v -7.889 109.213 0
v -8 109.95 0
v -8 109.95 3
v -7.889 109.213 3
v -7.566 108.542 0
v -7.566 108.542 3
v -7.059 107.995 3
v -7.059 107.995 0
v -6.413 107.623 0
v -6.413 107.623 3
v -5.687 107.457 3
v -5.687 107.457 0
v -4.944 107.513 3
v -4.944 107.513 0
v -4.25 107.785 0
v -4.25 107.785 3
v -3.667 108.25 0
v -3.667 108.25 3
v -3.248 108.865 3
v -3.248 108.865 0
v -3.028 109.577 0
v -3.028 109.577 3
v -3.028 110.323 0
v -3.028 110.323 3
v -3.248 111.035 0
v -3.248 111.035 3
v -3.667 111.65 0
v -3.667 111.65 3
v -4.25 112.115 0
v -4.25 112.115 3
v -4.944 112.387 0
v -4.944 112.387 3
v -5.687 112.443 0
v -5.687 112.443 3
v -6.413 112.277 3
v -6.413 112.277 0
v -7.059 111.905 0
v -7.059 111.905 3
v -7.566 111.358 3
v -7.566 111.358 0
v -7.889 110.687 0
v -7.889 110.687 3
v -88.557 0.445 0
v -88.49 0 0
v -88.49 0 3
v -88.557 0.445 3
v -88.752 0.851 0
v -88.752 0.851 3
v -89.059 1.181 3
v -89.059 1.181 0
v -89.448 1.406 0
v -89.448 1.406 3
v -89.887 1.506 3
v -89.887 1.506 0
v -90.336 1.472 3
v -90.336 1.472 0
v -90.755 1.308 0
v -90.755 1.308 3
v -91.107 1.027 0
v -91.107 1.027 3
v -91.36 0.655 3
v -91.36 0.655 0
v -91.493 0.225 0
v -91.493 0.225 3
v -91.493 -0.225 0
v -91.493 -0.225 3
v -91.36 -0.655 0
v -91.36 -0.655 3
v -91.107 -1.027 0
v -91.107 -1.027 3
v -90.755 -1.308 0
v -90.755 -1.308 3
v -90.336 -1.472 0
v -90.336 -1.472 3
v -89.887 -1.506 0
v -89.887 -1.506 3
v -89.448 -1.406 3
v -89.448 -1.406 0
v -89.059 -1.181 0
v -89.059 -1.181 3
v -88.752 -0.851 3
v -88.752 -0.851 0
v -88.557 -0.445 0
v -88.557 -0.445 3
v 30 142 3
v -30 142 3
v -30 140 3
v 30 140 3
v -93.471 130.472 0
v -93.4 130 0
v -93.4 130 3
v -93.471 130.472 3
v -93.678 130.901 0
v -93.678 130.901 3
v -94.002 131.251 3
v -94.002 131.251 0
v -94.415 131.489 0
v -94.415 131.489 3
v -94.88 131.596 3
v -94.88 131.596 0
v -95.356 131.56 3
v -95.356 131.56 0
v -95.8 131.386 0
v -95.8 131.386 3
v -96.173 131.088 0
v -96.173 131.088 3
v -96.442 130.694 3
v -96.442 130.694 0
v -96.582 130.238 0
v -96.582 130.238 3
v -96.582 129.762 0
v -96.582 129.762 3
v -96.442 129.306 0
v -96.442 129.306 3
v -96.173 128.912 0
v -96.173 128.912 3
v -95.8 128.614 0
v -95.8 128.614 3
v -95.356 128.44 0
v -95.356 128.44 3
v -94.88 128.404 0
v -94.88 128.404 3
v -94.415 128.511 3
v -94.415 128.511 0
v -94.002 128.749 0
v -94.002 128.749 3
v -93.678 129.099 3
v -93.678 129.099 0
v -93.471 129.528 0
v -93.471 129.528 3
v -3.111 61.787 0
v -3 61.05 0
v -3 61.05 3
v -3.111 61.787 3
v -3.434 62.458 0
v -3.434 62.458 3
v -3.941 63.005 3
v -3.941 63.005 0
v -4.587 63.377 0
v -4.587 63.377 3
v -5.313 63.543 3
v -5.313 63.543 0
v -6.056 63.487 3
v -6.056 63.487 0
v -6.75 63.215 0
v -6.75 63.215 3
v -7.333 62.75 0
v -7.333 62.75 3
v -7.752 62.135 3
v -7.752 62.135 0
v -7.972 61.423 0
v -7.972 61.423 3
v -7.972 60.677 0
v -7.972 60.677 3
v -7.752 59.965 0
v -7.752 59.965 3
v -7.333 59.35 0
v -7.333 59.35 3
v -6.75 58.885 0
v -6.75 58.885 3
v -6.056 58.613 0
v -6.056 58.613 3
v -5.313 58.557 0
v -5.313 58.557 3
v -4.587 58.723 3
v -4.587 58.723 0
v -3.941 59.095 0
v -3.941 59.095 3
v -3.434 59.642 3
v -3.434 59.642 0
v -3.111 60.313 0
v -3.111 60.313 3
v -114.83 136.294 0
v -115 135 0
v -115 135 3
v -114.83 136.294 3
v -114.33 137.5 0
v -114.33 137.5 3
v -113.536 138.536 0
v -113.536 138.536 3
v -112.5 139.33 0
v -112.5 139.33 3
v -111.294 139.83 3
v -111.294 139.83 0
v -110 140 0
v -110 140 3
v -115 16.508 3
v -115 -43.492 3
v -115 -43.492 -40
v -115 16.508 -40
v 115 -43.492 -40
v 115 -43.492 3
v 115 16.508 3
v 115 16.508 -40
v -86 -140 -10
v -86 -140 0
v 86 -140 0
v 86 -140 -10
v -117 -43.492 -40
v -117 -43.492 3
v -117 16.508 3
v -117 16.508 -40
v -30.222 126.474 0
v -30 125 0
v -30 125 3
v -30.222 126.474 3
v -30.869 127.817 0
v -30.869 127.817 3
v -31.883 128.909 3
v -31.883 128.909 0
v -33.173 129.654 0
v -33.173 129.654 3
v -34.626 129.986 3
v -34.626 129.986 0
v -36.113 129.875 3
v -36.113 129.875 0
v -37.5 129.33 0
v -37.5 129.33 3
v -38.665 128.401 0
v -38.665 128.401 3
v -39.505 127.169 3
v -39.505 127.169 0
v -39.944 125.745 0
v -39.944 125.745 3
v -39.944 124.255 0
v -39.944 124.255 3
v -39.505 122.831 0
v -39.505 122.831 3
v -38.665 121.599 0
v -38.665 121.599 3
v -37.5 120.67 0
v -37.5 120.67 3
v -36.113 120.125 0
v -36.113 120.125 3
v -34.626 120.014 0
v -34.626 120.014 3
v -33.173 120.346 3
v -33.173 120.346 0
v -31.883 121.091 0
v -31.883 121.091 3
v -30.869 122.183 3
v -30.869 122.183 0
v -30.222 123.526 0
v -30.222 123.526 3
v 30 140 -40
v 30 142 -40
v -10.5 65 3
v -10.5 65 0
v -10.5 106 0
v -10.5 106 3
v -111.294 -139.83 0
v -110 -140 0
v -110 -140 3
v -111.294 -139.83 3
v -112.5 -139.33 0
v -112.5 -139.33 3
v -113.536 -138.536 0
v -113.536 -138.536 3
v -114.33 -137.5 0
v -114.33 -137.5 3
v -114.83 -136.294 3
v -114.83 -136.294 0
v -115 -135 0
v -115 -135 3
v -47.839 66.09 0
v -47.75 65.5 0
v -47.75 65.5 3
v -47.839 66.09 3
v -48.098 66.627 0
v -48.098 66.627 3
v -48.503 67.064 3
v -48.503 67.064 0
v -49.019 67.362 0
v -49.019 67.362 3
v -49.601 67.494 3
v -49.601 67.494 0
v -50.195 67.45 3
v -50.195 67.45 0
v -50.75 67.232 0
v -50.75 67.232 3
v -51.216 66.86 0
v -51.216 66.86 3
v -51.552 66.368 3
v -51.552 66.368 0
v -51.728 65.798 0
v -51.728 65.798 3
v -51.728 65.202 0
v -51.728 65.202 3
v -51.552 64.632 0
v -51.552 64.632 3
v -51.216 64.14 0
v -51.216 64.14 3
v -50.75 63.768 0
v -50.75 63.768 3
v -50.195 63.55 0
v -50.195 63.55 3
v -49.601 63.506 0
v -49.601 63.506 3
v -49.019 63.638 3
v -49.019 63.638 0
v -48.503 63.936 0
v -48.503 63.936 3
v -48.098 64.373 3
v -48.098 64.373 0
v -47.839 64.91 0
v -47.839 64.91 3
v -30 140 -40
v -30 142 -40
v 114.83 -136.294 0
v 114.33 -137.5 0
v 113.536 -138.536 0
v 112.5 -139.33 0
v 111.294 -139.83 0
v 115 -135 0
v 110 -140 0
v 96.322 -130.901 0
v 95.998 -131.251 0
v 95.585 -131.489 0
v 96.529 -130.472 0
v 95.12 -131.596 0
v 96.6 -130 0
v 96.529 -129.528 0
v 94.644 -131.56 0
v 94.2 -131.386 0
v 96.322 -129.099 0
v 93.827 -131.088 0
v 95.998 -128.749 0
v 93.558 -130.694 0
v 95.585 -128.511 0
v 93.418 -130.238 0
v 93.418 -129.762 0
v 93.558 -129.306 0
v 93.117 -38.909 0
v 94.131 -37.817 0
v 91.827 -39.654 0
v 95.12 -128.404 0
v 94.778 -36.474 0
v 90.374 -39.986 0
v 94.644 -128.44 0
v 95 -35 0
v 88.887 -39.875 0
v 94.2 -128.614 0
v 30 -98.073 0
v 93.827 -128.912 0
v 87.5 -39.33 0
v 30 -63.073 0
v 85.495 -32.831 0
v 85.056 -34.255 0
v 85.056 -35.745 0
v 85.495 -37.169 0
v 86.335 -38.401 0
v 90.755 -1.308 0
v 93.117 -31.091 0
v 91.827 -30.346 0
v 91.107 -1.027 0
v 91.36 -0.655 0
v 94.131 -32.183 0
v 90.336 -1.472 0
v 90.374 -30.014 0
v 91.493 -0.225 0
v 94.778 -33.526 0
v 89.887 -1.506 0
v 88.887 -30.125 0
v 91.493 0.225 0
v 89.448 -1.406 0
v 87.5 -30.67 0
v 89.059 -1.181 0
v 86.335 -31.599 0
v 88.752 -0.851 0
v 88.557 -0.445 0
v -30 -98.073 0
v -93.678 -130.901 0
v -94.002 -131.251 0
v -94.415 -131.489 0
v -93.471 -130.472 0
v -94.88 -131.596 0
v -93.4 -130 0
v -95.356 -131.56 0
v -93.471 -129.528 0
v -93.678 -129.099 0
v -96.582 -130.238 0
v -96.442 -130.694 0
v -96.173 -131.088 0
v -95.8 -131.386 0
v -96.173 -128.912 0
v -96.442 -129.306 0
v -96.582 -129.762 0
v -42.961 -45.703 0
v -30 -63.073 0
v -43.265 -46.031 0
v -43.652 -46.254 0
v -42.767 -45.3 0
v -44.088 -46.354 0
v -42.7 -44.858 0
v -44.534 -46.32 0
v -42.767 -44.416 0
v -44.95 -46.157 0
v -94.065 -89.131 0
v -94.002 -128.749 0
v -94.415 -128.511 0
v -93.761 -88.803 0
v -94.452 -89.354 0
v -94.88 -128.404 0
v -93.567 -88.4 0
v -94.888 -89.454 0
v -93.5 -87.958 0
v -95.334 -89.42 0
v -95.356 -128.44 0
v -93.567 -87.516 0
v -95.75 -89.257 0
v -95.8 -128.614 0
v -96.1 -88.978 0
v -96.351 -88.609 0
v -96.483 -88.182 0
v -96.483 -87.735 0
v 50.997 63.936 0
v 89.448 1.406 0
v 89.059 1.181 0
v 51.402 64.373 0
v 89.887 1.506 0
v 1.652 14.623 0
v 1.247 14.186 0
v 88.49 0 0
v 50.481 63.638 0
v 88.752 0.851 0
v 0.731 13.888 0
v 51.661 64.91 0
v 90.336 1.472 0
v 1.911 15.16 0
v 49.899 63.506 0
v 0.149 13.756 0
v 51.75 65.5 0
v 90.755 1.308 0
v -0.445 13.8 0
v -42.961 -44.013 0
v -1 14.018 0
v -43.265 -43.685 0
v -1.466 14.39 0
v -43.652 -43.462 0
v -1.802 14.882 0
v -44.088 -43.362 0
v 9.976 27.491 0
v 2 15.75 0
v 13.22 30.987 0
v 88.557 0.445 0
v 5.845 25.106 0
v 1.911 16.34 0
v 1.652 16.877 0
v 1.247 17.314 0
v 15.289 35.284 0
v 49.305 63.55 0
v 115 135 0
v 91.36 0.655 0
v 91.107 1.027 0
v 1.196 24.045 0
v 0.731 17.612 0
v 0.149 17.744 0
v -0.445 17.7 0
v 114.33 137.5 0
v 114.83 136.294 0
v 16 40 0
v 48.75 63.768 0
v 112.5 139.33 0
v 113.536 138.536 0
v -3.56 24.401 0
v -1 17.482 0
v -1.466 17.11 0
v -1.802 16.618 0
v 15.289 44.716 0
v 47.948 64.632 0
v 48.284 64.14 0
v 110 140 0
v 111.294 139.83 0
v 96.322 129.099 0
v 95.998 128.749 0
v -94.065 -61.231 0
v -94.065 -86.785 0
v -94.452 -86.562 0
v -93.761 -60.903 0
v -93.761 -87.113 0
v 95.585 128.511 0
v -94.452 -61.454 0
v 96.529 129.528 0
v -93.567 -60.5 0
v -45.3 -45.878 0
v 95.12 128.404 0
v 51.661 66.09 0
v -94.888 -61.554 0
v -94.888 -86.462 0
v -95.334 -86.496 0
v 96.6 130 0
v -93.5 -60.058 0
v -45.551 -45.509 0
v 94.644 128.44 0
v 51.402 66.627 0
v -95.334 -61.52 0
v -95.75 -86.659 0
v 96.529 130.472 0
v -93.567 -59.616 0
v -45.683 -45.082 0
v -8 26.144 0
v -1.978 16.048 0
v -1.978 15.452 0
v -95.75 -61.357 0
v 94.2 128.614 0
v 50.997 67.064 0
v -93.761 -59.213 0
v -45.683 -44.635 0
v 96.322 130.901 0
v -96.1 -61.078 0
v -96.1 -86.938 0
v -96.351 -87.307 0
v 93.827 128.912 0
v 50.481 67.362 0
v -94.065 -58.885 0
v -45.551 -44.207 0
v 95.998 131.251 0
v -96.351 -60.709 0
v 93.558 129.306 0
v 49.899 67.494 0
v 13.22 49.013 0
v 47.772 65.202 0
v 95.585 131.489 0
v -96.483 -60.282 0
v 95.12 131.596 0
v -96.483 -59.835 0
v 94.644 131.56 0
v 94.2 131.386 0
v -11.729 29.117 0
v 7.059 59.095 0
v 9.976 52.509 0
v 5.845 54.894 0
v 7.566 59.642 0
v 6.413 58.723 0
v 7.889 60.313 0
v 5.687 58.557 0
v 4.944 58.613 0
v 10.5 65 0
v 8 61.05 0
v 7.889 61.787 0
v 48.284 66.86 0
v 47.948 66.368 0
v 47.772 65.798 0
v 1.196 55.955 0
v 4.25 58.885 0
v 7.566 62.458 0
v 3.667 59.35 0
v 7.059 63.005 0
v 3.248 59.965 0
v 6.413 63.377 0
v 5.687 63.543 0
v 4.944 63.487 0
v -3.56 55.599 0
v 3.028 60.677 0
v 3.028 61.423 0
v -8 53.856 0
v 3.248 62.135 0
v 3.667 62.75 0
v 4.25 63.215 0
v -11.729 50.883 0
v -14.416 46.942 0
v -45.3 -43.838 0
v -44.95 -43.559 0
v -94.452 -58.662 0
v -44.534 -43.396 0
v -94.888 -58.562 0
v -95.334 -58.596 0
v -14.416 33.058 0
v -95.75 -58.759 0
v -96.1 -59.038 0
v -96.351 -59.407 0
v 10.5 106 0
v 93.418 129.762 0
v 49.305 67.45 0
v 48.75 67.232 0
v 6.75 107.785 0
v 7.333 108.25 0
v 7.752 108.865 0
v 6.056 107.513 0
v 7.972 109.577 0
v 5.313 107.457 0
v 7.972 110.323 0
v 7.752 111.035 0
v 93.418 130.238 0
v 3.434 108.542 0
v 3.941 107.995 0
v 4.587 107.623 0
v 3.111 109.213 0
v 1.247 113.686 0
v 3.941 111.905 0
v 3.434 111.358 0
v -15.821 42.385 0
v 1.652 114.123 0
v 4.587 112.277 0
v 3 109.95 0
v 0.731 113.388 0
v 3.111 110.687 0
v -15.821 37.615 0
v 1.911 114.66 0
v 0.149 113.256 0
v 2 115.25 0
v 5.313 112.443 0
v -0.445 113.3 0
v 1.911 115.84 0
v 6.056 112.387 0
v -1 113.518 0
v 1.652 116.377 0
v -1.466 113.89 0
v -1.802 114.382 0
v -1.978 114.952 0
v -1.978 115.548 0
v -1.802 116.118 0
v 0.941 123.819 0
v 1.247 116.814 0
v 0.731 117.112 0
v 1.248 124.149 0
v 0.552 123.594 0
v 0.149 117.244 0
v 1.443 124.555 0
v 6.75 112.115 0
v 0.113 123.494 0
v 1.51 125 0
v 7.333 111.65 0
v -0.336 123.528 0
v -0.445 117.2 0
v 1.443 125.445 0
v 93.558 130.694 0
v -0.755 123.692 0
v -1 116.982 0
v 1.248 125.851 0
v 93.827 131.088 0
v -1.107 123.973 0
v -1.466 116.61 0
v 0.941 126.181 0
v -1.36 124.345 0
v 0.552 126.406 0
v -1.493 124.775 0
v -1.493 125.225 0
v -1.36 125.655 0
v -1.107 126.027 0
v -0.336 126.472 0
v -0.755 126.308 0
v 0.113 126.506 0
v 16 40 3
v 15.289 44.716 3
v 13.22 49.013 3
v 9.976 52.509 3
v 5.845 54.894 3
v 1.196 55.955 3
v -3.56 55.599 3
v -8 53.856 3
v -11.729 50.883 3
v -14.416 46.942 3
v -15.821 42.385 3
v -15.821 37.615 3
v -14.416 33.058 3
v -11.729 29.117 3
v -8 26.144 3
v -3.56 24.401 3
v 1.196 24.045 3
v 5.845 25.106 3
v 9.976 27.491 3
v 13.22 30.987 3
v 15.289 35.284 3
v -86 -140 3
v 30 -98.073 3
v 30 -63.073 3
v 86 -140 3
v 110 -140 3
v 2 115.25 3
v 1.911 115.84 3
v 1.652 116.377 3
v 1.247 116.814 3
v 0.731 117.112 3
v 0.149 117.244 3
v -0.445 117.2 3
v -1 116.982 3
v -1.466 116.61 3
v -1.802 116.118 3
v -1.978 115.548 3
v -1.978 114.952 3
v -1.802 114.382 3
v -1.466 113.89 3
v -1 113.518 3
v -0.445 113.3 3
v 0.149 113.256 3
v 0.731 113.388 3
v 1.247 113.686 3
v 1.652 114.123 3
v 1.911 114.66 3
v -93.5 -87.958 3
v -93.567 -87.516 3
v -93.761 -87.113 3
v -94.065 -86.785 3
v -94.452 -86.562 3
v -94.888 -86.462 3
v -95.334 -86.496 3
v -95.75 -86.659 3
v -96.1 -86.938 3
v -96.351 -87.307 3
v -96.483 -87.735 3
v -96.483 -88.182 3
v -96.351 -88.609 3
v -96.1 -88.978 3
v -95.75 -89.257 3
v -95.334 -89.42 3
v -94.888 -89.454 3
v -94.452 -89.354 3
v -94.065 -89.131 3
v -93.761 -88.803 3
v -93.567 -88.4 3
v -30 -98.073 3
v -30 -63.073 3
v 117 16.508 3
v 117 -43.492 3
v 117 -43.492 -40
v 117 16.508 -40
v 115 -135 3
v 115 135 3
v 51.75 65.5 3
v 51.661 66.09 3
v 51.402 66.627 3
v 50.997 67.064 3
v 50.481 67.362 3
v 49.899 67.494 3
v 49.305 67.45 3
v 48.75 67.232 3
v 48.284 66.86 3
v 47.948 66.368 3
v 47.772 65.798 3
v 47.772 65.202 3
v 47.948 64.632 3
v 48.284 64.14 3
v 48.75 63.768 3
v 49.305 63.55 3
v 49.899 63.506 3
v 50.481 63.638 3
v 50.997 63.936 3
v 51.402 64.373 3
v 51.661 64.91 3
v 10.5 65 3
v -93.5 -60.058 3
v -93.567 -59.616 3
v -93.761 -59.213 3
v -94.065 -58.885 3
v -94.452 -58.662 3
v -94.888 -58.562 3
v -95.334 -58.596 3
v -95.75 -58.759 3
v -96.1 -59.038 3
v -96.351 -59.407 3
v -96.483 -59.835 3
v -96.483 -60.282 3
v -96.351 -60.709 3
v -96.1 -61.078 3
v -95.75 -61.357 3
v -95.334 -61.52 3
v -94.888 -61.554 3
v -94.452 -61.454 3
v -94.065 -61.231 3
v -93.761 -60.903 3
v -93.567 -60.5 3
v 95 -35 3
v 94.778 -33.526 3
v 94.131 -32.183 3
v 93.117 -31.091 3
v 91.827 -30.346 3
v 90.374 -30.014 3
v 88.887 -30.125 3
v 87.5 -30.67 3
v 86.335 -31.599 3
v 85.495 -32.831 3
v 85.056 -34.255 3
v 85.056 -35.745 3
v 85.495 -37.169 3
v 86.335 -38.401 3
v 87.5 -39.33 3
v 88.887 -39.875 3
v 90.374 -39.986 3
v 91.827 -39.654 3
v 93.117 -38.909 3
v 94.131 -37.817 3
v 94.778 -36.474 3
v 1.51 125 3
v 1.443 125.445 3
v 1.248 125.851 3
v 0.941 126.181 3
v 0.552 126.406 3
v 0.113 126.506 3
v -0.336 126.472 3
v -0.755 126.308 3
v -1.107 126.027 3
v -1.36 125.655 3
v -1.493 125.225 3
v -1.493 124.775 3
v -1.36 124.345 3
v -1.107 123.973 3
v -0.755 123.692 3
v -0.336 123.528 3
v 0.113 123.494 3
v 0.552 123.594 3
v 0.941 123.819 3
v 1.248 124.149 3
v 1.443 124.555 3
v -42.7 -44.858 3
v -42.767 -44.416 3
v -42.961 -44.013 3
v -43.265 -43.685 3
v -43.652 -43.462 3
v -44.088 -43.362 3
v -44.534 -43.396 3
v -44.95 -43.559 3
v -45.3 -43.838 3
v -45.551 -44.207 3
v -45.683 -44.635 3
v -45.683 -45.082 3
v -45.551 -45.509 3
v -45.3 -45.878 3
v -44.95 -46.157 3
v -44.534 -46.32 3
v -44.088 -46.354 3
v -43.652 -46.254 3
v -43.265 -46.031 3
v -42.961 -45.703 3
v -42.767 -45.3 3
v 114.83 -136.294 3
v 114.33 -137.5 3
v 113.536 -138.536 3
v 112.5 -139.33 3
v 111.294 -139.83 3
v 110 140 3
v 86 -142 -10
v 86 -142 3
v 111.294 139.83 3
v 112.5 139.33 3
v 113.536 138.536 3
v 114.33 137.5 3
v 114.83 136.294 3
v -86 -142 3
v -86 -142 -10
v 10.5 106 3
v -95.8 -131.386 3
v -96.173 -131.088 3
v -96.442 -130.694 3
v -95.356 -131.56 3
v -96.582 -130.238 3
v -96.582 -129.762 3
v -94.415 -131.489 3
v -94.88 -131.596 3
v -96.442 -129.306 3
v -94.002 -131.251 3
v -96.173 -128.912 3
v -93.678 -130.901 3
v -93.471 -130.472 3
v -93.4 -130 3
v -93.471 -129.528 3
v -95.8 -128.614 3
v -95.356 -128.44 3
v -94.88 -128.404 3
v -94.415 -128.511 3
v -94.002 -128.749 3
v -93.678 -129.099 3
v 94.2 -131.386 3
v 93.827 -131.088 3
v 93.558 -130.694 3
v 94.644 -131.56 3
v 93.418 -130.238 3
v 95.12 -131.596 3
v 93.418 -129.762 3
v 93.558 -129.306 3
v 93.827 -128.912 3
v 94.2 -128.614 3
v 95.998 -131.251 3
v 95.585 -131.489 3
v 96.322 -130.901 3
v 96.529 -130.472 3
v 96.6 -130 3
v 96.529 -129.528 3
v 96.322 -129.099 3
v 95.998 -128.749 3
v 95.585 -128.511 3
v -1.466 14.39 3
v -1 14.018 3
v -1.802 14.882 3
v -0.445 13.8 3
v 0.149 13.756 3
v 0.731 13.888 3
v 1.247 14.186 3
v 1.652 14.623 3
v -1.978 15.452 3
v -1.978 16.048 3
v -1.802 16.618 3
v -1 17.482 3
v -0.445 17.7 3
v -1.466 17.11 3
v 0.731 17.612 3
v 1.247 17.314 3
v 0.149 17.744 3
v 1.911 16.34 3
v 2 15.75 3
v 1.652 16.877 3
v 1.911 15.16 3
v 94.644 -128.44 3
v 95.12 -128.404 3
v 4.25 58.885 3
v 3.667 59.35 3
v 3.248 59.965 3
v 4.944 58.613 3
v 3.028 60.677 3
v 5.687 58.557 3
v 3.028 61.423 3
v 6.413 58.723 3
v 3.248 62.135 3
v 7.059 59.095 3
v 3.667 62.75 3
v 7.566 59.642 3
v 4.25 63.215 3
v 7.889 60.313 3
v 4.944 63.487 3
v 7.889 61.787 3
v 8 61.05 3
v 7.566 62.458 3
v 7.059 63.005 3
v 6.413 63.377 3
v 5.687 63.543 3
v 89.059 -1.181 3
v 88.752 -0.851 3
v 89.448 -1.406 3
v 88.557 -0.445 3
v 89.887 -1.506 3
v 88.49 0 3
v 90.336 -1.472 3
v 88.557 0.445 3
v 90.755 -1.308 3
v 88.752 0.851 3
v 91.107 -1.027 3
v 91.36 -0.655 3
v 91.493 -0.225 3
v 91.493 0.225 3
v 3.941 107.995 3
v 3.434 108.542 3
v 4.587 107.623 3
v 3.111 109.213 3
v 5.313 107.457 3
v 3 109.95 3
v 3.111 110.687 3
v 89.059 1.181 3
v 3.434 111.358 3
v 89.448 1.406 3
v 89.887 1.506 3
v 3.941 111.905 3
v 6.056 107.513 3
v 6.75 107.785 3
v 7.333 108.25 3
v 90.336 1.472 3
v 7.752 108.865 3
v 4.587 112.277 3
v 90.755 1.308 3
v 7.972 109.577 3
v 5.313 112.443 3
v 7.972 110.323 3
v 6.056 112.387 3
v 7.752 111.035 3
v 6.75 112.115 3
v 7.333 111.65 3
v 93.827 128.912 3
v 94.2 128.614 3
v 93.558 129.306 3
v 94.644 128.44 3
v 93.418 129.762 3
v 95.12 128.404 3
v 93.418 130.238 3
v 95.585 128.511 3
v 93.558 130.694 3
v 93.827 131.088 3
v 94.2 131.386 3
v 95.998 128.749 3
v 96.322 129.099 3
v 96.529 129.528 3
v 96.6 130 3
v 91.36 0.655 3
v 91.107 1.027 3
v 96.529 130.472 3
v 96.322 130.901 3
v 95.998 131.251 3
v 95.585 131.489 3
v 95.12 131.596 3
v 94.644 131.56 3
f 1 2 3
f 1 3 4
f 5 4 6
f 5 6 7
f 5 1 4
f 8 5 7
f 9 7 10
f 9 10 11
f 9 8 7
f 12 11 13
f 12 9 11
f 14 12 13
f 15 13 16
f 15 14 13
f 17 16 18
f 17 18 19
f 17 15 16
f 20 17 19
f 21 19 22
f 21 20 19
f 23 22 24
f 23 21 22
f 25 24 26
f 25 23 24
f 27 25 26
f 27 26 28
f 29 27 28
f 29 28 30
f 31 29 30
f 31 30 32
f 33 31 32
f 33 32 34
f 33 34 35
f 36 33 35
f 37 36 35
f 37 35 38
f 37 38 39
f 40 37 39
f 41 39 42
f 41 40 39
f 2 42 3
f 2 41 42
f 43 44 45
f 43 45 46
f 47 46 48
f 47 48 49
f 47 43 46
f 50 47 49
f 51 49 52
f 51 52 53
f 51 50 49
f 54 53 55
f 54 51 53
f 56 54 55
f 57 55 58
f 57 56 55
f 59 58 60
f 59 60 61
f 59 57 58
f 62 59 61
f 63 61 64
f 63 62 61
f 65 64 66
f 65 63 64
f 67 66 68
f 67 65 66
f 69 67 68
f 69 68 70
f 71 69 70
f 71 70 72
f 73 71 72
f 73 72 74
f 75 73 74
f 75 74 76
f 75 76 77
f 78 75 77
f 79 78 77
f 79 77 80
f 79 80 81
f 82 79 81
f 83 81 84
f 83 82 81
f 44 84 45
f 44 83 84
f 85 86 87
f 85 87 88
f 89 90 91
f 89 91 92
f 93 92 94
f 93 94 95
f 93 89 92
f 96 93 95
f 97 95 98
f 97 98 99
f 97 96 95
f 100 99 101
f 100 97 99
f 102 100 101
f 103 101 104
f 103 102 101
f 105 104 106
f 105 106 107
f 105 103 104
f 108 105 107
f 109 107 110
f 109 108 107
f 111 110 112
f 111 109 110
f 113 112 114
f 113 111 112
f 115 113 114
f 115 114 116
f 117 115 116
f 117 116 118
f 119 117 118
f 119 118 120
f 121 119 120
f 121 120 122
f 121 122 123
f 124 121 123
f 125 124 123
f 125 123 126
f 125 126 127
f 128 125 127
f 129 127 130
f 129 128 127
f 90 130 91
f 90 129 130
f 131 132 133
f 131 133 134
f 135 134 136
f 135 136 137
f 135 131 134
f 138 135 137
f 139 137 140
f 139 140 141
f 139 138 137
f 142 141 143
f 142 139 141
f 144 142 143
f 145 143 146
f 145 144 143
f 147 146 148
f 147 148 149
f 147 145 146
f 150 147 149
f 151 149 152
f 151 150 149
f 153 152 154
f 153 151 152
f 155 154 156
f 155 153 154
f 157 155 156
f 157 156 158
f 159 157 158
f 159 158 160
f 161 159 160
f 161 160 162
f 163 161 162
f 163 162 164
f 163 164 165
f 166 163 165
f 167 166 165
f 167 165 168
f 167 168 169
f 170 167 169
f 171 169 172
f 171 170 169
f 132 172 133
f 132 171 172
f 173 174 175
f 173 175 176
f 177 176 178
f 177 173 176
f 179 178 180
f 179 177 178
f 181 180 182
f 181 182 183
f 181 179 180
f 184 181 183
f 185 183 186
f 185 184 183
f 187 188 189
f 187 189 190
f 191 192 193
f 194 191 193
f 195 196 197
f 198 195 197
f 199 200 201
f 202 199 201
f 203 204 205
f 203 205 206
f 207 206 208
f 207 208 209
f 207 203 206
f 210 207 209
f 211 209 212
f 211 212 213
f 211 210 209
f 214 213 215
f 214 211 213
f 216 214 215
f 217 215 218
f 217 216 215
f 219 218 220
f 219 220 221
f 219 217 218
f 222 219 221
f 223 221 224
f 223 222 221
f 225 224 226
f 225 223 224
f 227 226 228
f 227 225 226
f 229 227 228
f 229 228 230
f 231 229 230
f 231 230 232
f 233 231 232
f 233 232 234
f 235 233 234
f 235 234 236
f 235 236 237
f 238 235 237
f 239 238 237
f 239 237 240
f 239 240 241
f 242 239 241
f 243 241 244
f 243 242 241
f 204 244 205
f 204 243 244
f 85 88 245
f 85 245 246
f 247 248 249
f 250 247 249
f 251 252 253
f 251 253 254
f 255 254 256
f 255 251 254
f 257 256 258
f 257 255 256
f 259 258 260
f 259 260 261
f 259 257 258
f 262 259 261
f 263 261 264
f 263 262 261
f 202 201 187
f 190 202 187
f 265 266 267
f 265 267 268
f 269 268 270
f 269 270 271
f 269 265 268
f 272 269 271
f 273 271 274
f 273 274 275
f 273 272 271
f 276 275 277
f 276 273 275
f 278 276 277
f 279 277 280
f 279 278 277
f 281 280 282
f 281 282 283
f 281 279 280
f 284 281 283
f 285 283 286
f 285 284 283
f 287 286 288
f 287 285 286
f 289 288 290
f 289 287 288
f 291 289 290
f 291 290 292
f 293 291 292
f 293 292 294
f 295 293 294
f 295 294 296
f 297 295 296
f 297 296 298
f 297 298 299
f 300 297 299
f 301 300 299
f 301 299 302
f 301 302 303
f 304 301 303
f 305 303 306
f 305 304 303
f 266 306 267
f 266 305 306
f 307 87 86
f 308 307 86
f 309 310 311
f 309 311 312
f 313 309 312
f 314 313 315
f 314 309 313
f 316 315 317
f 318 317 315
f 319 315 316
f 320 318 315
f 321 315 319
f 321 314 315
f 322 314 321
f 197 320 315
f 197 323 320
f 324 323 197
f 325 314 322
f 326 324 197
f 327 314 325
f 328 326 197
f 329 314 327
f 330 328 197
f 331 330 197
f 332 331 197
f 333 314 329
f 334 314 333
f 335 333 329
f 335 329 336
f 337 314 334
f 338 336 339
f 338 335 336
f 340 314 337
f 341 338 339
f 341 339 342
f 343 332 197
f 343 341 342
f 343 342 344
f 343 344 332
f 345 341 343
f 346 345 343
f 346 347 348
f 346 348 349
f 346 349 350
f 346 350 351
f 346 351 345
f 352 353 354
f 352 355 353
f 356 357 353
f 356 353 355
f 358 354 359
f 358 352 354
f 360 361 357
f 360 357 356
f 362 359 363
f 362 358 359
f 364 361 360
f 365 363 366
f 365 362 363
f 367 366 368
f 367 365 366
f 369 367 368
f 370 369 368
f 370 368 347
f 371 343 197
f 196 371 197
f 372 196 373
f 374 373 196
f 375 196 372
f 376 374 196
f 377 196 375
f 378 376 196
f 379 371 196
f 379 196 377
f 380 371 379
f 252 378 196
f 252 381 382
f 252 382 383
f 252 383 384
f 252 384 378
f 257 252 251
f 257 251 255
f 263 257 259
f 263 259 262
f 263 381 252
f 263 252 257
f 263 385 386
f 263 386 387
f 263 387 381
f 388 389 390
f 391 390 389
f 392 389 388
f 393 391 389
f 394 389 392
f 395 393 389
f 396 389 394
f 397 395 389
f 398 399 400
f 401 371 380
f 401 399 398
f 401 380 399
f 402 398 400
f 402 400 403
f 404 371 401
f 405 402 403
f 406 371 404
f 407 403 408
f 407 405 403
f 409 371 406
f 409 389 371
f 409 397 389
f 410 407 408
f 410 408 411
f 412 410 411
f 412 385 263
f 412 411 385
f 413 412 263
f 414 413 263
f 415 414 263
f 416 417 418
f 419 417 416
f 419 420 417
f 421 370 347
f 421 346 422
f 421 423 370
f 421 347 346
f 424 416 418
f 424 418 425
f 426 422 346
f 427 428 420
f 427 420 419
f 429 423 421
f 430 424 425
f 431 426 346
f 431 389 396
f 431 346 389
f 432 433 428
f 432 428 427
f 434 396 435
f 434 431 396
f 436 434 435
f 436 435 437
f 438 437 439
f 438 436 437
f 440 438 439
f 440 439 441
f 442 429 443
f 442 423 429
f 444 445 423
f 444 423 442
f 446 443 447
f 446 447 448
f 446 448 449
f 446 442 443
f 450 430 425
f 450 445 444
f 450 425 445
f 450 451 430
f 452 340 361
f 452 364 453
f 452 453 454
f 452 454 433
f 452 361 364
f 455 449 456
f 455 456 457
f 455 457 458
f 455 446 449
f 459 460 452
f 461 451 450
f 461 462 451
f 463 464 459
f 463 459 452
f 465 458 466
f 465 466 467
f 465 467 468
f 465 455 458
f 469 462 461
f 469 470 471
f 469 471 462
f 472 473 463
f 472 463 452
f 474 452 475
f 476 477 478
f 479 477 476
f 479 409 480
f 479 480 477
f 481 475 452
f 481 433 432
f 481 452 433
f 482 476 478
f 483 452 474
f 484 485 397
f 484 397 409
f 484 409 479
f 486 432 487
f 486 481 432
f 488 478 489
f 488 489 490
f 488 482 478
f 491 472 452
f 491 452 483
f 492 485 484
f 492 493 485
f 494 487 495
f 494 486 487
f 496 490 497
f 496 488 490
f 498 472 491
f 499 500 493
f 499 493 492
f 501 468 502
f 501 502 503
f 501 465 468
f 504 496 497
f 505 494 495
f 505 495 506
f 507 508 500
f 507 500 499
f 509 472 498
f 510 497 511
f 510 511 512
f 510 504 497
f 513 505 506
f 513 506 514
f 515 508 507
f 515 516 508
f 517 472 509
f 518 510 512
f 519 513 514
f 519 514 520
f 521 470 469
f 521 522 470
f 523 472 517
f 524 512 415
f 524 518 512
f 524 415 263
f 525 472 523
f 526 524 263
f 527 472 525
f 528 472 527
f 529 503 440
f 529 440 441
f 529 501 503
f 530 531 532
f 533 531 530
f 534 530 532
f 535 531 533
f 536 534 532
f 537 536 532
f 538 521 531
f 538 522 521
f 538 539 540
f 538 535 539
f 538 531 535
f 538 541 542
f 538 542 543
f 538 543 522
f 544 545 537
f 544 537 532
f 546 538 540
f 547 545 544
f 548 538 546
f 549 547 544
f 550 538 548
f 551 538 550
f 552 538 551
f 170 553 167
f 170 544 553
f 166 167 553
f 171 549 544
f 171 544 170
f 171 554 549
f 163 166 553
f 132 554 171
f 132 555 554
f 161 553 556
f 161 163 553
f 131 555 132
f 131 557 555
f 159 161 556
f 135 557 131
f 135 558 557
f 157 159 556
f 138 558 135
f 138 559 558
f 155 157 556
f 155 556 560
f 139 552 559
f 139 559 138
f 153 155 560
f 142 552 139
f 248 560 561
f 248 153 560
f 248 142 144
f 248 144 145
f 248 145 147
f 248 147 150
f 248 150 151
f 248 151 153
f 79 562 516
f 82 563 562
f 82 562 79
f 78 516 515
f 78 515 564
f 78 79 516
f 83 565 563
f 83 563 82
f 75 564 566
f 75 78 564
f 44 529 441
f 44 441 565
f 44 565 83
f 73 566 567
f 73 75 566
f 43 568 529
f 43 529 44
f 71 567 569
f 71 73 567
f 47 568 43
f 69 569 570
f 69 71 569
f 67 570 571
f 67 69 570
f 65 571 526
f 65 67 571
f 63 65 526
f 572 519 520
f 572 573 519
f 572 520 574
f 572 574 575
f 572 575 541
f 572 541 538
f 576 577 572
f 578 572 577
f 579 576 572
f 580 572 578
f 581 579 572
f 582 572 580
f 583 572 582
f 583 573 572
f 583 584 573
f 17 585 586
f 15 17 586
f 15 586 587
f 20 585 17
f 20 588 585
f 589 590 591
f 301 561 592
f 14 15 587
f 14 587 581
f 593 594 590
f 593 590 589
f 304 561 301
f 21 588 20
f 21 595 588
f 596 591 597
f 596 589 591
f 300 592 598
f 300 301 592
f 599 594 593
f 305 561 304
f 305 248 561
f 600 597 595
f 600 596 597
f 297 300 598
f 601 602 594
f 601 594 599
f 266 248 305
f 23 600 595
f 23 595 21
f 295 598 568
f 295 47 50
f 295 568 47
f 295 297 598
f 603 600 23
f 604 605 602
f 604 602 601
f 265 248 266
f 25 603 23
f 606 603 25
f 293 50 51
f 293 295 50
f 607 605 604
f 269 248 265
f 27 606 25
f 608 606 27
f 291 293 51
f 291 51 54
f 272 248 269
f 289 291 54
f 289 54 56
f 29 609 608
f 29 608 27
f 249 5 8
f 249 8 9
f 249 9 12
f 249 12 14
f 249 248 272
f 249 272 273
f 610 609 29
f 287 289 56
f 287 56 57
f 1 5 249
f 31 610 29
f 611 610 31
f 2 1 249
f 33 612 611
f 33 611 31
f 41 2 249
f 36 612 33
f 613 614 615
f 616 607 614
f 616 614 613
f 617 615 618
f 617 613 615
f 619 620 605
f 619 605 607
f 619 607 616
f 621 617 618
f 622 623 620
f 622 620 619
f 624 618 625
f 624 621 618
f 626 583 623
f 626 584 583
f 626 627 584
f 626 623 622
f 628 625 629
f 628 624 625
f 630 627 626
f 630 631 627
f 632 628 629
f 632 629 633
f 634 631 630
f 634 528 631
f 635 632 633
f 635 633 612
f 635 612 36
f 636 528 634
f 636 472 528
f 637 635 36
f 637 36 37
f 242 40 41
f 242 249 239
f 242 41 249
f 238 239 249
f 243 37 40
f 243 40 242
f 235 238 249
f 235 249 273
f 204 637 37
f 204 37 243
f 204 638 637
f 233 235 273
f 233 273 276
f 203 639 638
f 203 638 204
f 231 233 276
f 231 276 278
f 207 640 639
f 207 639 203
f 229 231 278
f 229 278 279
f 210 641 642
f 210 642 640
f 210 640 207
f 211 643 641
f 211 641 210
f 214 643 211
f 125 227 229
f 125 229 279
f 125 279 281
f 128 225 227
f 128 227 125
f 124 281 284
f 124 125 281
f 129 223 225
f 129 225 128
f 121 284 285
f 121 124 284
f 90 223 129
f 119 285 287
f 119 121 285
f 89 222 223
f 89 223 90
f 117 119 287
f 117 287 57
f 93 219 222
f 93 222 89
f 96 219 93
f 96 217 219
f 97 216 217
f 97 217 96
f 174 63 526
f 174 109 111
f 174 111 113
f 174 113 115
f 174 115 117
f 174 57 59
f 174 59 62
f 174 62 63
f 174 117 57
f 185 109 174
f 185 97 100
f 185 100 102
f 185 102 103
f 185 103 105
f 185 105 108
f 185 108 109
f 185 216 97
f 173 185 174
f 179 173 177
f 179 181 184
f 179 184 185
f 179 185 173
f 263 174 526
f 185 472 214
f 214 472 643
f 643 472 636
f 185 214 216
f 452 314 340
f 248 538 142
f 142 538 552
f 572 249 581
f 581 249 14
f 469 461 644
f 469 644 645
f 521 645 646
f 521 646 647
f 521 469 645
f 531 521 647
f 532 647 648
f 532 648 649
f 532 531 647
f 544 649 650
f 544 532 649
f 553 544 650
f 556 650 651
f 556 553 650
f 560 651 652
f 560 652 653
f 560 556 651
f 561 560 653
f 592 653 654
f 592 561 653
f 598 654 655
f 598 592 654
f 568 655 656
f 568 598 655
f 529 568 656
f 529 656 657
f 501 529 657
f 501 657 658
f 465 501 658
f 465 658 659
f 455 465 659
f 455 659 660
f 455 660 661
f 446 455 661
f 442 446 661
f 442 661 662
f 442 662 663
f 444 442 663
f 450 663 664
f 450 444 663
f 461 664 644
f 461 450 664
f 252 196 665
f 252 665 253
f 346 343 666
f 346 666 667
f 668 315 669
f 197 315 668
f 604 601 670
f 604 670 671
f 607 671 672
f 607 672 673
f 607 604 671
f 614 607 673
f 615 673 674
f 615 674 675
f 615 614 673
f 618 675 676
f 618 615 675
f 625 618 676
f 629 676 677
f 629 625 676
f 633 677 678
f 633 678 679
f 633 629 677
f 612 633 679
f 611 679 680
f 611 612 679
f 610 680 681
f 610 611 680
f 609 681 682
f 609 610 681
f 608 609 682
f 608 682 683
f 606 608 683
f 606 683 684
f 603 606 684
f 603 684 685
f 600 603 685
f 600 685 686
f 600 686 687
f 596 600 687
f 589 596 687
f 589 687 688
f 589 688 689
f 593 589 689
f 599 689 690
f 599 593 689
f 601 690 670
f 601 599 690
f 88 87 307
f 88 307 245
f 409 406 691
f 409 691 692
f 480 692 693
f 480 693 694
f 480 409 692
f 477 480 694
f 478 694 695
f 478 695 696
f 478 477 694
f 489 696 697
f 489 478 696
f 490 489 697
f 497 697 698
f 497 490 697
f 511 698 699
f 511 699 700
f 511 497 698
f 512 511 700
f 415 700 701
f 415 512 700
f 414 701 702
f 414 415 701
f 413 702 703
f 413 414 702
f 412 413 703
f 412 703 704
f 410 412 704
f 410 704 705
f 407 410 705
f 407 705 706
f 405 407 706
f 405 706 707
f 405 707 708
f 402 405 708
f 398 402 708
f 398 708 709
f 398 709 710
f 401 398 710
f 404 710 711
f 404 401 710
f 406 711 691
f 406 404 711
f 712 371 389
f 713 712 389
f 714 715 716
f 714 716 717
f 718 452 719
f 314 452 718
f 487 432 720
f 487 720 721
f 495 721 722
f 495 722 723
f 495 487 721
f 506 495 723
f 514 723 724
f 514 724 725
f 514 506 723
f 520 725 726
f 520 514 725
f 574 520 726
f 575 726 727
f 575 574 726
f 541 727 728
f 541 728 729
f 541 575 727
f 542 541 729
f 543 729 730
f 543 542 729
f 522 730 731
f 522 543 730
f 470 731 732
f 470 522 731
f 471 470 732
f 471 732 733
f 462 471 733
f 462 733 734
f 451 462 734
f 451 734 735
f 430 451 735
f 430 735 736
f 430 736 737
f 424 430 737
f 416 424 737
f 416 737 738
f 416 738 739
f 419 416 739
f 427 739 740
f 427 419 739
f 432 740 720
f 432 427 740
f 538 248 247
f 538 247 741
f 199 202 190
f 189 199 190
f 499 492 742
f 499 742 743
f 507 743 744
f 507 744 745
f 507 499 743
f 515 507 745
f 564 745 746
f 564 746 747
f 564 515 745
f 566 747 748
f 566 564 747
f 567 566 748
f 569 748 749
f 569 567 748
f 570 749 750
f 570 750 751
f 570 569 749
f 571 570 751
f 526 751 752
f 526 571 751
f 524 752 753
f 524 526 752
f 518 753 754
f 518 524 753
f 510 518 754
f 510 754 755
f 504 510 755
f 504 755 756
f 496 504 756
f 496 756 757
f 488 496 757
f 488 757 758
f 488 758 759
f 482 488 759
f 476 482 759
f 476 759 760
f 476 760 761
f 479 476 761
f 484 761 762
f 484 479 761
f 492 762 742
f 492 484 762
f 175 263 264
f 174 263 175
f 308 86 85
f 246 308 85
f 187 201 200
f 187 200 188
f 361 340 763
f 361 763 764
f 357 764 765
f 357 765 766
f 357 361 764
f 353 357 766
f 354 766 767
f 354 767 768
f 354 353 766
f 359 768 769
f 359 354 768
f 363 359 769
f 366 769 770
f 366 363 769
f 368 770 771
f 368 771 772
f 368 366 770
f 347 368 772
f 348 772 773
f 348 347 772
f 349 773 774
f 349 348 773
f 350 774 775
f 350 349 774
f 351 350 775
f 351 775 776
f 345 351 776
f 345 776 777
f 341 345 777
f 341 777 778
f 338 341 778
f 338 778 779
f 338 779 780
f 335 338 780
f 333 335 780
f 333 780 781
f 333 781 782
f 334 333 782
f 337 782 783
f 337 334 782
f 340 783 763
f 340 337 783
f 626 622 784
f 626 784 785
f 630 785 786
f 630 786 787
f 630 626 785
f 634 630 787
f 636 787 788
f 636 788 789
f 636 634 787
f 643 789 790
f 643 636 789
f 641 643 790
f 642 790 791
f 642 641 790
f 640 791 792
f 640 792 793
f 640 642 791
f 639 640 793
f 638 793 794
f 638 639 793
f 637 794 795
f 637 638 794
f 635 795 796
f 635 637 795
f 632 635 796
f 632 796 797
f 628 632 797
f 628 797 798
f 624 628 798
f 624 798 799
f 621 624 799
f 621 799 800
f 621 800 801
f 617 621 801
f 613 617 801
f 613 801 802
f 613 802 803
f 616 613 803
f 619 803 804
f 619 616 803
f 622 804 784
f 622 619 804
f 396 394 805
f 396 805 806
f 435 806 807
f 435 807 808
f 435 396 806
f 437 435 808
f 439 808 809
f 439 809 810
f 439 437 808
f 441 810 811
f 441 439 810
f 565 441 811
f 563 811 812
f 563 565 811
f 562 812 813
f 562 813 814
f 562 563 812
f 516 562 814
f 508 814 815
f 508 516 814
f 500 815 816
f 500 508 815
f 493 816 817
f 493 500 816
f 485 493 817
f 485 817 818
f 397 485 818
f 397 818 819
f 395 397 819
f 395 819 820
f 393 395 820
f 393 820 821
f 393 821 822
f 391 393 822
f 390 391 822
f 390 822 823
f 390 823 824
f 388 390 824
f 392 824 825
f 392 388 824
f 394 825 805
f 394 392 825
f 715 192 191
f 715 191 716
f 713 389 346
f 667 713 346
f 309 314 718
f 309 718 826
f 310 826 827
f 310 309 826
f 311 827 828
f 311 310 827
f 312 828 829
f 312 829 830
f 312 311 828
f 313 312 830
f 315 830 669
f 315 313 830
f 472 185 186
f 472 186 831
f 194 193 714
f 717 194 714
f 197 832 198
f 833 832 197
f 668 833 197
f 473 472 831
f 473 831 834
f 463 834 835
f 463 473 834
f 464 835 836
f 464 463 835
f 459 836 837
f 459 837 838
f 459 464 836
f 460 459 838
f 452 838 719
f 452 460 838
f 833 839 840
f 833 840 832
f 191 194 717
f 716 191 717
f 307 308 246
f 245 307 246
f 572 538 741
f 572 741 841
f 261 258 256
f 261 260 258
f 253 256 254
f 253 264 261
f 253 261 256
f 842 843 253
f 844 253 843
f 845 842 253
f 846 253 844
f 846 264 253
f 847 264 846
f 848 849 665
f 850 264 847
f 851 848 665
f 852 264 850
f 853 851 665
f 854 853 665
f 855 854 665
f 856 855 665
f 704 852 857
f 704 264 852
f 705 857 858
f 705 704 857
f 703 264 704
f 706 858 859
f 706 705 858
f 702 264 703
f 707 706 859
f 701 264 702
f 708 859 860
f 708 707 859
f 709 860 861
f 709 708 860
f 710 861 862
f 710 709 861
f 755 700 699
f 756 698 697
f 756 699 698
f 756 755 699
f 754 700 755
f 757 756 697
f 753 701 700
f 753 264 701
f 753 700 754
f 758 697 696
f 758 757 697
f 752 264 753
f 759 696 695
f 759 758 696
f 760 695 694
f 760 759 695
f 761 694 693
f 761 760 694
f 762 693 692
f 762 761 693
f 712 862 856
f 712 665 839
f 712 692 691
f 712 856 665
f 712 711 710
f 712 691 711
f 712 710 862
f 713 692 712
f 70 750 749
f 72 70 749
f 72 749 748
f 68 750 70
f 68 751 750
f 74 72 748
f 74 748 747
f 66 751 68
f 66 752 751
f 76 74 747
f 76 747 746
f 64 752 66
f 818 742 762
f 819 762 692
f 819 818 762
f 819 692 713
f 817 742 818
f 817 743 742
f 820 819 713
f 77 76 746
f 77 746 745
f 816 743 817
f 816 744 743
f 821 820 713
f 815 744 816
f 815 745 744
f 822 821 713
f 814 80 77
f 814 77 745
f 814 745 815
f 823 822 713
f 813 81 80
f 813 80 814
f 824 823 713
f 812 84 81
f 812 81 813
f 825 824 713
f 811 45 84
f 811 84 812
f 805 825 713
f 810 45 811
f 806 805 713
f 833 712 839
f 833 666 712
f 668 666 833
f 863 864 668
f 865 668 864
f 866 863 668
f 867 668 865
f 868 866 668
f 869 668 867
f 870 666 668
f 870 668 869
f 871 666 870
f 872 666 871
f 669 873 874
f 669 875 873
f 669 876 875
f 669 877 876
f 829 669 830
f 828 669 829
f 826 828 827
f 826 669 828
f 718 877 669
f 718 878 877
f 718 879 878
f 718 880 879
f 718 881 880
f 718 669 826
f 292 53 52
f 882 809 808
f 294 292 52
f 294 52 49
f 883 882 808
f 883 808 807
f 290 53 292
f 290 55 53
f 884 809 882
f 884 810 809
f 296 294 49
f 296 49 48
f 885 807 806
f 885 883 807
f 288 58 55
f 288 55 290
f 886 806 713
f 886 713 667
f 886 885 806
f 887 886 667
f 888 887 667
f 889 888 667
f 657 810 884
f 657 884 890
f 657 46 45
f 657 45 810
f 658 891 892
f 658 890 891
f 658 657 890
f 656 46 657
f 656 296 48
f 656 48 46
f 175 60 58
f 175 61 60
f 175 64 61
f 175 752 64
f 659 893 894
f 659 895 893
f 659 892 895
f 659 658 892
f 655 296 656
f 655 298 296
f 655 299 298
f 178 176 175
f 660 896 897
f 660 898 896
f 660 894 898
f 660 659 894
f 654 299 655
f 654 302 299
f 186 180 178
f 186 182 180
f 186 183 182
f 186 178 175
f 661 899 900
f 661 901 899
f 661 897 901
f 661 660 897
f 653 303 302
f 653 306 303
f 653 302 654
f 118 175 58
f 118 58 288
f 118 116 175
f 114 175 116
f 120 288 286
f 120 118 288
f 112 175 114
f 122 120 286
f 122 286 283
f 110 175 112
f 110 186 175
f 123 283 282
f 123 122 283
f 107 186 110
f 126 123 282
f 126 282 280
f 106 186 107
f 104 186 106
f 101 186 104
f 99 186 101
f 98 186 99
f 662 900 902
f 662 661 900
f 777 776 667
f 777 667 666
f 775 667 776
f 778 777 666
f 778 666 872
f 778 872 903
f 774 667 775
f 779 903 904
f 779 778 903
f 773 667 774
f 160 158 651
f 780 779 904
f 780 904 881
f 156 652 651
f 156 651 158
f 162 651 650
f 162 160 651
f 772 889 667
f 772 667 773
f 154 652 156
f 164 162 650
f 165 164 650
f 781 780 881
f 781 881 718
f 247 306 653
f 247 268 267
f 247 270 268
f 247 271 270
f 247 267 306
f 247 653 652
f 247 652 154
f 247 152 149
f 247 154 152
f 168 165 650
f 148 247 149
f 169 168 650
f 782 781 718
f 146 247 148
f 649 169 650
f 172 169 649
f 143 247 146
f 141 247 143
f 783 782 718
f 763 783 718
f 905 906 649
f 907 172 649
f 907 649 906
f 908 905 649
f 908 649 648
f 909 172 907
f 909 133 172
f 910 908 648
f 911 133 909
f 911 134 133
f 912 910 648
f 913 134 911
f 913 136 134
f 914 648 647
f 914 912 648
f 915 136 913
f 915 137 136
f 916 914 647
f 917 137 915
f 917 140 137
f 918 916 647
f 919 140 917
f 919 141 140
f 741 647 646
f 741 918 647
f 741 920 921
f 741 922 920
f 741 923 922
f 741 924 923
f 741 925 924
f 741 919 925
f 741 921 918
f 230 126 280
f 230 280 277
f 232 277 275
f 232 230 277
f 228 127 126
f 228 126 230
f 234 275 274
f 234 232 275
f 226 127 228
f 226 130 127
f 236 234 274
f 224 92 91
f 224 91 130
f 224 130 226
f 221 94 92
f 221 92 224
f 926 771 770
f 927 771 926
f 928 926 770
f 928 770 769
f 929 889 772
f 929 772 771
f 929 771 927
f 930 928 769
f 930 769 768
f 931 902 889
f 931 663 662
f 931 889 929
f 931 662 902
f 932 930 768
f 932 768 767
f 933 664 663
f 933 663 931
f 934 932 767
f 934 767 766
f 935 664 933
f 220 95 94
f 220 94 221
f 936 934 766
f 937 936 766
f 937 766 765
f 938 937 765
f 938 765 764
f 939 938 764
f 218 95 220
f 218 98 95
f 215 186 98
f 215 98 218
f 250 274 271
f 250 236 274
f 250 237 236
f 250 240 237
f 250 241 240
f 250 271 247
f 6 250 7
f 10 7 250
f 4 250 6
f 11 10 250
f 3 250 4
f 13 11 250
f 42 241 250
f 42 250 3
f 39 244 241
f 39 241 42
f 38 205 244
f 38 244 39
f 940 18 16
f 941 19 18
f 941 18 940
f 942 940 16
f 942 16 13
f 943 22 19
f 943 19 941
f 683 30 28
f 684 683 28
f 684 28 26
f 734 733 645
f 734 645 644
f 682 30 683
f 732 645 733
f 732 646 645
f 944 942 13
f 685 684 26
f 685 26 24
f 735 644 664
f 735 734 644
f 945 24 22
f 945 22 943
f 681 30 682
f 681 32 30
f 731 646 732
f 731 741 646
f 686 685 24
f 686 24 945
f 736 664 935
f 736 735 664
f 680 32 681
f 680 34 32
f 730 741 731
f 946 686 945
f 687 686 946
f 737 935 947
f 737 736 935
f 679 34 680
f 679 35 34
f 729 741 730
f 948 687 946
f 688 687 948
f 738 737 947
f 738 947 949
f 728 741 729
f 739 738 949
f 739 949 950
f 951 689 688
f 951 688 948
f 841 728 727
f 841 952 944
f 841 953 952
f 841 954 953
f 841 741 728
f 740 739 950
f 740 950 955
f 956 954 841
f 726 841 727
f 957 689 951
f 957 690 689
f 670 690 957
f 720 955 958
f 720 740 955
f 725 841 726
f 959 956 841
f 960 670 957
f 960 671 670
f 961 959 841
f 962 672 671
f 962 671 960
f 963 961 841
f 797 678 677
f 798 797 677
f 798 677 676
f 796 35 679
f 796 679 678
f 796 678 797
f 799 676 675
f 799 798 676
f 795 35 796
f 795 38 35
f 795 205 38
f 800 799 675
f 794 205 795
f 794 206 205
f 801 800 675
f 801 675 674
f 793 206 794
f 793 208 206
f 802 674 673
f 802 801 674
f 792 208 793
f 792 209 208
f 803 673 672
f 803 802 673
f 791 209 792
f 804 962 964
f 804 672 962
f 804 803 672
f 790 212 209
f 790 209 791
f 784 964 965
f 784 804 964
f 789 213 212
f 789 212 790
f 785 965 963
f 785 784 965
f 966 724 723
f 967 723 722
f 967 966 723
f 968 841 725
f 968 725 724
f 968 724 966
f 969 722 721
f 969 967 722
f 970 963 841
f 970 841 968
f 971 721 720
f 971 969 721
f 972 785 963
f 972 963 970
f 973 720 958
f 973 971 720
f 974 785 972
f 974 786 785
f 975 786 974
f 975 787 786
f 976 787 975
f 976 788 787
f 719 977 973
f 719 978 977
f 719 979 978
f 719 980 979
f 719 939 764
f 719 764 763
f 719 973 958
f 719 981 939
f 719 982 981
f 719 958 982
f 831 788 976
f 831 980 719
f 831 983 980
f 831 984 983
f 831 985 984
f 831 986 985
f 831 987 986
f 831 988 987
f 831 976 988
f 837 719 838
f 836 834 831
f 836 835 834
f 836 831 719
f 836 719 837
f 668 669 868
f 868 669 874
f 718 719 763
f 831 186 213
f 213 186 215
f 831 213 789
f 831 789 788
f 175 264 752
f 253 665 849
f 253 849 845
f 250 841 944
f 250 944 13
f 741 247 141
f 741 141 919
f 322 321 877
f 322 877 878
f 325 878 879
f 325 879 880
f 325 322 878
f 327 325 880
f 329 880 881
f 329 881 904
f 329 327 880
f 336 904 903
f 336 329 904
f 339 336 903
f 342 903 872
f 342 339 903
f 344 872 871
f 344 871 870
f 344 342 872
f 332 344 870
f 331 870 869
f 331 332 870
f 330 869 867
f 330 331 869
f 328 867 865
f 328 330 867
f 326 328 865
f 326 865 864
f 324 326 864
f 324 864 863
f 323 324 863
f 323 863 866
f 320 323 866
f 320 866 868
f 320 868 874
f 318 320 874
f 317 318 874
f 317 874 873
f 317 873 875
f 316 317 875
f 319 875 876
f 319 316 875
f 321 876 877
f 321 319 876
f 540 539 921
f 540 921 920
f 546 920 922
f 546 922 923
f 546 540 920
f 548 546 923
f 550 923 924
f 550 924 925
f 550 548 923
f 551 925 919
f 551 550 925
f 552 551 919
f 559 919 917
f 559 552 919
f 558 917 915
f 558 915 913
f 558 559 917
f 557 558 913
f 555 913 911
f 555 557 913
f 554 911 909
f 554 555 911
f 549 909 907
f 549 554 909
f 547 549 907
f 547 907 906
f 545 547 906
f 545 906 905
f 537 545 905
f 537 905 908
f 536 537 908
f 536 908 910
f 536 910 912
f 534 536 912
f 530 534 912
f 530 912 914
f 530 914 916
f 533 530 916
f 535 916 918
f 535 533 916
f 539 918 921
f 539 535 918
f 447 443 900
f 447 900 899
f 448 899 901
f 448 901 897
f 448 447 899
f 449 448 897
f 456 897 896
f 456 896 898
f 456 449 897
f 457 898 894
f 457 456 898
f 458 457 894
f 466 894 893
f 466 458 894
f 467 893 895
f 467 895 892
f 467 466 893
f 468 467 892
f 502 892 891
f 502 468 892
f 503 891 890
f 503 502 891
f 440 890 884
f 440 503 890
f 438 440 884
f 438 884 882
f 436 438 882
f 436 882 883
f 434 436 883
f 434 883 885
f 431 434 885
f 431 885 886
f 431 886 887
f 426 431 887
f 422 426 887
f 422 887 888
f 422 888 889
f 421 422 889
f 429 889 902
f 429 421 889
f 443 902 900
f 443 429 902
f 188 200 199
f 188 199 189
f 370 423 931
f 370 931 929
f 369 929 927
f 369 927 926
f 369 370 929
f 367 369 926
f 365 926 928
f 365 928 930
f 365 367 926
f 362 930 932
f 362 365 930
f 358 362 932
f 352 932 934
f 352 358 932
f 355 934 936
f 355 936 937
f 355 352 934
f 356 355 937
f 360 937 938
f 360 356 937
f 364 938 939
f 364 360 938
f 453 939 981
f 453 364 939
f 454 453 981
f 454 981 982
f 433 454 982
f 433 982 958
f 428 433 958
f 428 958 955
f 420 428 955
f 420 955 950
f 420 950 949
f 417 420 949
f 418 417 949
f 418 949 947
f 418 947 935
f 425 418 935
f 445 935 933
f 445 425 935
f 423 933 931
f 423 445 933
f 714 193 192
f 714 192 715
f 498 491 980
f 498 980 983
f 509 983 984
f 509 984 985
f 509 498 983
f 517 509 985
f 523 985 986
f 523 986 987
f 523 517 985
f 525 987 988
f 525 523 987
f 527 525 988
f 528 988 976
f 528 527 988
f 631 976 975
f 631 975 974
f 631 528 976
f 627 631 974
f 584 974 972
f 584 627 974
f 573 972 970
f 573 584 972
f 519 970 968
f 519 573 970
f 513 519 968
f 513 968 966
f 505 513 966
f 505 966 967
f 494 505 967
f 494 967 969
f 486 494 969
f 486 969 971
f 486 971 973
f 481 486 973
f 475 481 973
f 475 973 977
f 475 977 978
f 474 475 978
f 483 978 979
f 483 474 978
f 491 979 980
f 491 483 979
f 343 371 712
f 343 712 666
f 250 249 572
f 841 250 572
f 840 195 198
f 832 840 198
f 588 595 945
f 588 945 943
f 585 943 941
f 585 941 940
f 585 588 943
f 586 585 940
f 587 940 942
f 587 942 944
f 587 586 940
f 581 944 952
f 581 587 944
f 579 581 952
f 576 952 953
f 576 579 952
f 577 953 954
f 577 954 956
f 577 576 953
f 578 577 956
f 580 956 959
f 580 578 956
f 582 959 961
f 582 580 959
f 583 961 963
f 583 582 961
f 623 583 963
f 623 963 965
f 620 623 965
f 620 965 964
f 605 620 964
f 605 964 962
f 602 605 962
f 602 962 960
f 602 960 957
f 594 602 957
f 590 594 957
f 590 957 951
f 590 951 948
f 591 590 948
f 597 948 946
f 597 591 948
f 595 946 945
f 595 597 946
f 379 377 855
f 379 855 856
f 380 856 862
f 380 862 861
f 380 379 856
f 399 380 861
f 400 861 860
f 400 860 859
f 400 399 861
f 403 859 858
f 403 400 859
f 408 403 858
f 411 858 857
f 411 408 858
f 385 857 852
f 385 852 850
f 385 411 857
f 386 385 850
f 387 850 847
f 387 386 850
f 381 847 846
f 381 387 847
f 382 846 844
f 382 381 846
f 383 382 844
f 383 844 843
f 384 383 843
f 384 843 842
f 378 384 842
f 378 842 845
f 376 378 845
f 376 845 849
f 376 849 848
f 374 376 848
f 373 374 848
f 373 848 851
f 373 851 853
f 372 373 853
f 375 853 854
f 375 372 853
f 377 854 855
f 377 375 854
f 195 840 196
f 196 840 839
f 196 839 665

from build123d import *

# Parameters (mm, degrees)
SKETCH_1_R        = 2
SKETCH_1_R_2      = 1.6
SKETCH_1_R_3      = 2.5
SKETCH_1_R_4      = 16
SKETCH_1_R_5      = 1.5
SKETCH_1_R_6      = 1.51
SKETCH_1_R_7      = 5
SKETCH_1_W        = 21
SKETCH_1_H        = 41
SKETCH_1_W_2      = 60
SKETCH_1_H_2      = 35
EXTRUDE_1_DEPTH   = 3
SKETCH_2_W        = 2
SKETCH_2_H        = 60
EXTRUDE_2_DEPTH   = 43
EXTRUDE_2_2_DEPTH = 43
SKETCH_2_W_2      = 60
SKETCH_2_H_2      = 2
EXTRUDE_2_3_DEPTH = 43
SKETCH_3_W        = 172
SKETCH_3_H        = 2
EXTRUDE_3_DEPTH   = 13


with BuildPart() as part:
    # 草图1 → 凸台-拉伸1 (new body)
    with BuildSketch(Plane.XY):
        with BuildLine():
            Line((105, -140), (-105, -140))
            Line((-105, -140), (-110, -140))
            ThreePointArc((-110, -140), (-113.535533906, -138.535533906), (-115, -135))
            Line((-115, -135), (-115, -130))
            Line((-115, -130), (-115, 130))
            Line((-115, 130), (-115, 135))
            ThreePointArc((-115, 135), (-113.535533906, 138.535533906), (-110, 140))
            Line((-110, 140), (-105, 140))
            Line((-105, 140), (105, 140))
            Line((105, 140), (110, 140))
            ThreePointArc((110, 140), (113.535533906, 138.535533906), (115, 135))
            Line((115, 135), (115, 130))
            Line((115, 130), (115, -130))
            Line((115, -130), (115, -135))
            ThreePointArc((115, -135), (113.535533906, -138.535533906), (110, -140))
            Line((110, -140), (105, -140))
        make_face()
        with Locations((0, 115.25)):
            Circle(SKETCH_1_R, mode=Mode.SUBTRACT)
        with Locations((-49.75, 65.5)):
            Circle(SKETCH_1_R, mode=Mode.SUBTRACT)
        with Locations((0, 15.75)):
            Circle(SKETCH_1_R, mode=Mode.SUBTRACT)
        with Locations((49.75, 65.5)):
            Circle(SKETCH_1_R, mode=Mode.SUBTRACT)
        with Locations((-95, -130)):
            Circle(SKETCH_1_R_2, mode=Mode.SUBTRACT)
        with Locations((95, -130)):
            Circle(SKETCH_1_R_2, mode=Mode.SUBTRACT)
        with Locations((-95, 130)):
            Circle(SKETCH_1_R_2, mode=Mode.SUBTRACT)
        with Locations((95, 130)):
            Circle(SKETCH_1_R_2, mode=Mode.SUBTRACT)
        with Locations((-5.5, 61.05)):
            Circle(SKETCH_1_R_3, mode=Mode.SUBTRACT)
        with Locations((5.5, 61.05)):
            Circle(SKETCH_1_R_3, mode=Mode.SUBTRACT)
        with Locations(Location((5.5, 109.95, 0), (0, 0, 180))):
            Circle(SKETCH_1_R_3, mode=Mode.SUBTRACT)
        with Locations(Location((-5.5, 109.95, 0), (0, 0, 180))):
            Circle(SKETCH_1_R_3, mode=Mode.SUBTRACT)
        with Locations((0, 40)):
            Circle(SKETCH_1_R_4, mode=Mode.SUBTRACT)
        with Locations((-95, -87.958075064)):
            Circle(SKETCH_1_R_5, mode=Mode.SUBTRACT)
        with Locations((-95, -60.058075064)):
            Circle(SKETCH_1_R_5, mode=Mode.SUBTRACT)
        with Locations((-44.2, -44.858075064)):
            Circle(SKETCH_1_R_5, mode=Mode.SUBTRACT)
        with Locations((-90, 0)):
            Circle(SKETCH_1_R_6, mode=Mode.SUBTRACT)
        with Locations(Location((90, 0, 0), (0, 0, 180))):
            Circle(SKETCH_1_R_6, mode=Mode.SUBTRACT)
        with Locations((0, 125)):
            Circle(SKETCH_1_R_6, mode=Mode.SUBTRACT)
        with Locations((-35, 125)):
            Circle(SKETCH_1_R_7, mode=Mode.SUBTRACT)
        with Locations((90, -35)):
            Circle(SKETCH_1_R_7, mode=Mode.SUBTRACT)
        with Locations((0, 85.5)):
            Rectangle(SKETCH_1_W, SKETCH_1_H, mode=Mode.SUBTRACT)
        with Locations((0, -80.572838145)):
            Rectangle(SKETCH_1_W_2, SKETCH_1_H_2, mode=Mode.SUBTRACT)
    extrude(amount=EXTRUDE_1_DEPTH)

    # 草图3 → 凸台-拉伸3 (add)
    with BuildSketch(Plane.XY.offset(3)):
        with Locations((0, -141)):
            Rectangle(SKETCH_3_W, SKETCH_3_H)
    extrude(amount=-EXTRUDE_3_DEPTH)


with BuildPart() as body_2:
    # 草图2 → 凸台-拉伸2 (new body)
    with BuildSketch(Plane.XY.offset(3)):
        with Locations((-116, -13.491825151)):
            Rectangle(SKETCH_2_W, SKETCH_2_H)
    extrude(amount=-EXTRUDE_2_DEPTH)


with BuildPart() as body_3:
    # 草图2 → Extrude 2 2 (new body)
    with BuildSketch(Plane.XY.offset(3)):
        with Locations((116, -13.491825151)):
            Rectangle(SKETCH_2_W, SKETCH_2_H)
    extrude(amount=-EXTRUDE_2_2_DEPTH)


with BuildPart() as body_4:
    # 草图2 → Extrude 2 3 (new body)
    with BuildSketch(Plane.XY.offset(3)):
        with Locations((0, 141)):
            Rectangle(SKETCH_2_W_2, SKETCH_2_H_2)
    extrude(amount=-EXTRUDE_2_3_DEPTH)


solid = Compound([part.part, body_2.part, body_3.part, body_4.part])
